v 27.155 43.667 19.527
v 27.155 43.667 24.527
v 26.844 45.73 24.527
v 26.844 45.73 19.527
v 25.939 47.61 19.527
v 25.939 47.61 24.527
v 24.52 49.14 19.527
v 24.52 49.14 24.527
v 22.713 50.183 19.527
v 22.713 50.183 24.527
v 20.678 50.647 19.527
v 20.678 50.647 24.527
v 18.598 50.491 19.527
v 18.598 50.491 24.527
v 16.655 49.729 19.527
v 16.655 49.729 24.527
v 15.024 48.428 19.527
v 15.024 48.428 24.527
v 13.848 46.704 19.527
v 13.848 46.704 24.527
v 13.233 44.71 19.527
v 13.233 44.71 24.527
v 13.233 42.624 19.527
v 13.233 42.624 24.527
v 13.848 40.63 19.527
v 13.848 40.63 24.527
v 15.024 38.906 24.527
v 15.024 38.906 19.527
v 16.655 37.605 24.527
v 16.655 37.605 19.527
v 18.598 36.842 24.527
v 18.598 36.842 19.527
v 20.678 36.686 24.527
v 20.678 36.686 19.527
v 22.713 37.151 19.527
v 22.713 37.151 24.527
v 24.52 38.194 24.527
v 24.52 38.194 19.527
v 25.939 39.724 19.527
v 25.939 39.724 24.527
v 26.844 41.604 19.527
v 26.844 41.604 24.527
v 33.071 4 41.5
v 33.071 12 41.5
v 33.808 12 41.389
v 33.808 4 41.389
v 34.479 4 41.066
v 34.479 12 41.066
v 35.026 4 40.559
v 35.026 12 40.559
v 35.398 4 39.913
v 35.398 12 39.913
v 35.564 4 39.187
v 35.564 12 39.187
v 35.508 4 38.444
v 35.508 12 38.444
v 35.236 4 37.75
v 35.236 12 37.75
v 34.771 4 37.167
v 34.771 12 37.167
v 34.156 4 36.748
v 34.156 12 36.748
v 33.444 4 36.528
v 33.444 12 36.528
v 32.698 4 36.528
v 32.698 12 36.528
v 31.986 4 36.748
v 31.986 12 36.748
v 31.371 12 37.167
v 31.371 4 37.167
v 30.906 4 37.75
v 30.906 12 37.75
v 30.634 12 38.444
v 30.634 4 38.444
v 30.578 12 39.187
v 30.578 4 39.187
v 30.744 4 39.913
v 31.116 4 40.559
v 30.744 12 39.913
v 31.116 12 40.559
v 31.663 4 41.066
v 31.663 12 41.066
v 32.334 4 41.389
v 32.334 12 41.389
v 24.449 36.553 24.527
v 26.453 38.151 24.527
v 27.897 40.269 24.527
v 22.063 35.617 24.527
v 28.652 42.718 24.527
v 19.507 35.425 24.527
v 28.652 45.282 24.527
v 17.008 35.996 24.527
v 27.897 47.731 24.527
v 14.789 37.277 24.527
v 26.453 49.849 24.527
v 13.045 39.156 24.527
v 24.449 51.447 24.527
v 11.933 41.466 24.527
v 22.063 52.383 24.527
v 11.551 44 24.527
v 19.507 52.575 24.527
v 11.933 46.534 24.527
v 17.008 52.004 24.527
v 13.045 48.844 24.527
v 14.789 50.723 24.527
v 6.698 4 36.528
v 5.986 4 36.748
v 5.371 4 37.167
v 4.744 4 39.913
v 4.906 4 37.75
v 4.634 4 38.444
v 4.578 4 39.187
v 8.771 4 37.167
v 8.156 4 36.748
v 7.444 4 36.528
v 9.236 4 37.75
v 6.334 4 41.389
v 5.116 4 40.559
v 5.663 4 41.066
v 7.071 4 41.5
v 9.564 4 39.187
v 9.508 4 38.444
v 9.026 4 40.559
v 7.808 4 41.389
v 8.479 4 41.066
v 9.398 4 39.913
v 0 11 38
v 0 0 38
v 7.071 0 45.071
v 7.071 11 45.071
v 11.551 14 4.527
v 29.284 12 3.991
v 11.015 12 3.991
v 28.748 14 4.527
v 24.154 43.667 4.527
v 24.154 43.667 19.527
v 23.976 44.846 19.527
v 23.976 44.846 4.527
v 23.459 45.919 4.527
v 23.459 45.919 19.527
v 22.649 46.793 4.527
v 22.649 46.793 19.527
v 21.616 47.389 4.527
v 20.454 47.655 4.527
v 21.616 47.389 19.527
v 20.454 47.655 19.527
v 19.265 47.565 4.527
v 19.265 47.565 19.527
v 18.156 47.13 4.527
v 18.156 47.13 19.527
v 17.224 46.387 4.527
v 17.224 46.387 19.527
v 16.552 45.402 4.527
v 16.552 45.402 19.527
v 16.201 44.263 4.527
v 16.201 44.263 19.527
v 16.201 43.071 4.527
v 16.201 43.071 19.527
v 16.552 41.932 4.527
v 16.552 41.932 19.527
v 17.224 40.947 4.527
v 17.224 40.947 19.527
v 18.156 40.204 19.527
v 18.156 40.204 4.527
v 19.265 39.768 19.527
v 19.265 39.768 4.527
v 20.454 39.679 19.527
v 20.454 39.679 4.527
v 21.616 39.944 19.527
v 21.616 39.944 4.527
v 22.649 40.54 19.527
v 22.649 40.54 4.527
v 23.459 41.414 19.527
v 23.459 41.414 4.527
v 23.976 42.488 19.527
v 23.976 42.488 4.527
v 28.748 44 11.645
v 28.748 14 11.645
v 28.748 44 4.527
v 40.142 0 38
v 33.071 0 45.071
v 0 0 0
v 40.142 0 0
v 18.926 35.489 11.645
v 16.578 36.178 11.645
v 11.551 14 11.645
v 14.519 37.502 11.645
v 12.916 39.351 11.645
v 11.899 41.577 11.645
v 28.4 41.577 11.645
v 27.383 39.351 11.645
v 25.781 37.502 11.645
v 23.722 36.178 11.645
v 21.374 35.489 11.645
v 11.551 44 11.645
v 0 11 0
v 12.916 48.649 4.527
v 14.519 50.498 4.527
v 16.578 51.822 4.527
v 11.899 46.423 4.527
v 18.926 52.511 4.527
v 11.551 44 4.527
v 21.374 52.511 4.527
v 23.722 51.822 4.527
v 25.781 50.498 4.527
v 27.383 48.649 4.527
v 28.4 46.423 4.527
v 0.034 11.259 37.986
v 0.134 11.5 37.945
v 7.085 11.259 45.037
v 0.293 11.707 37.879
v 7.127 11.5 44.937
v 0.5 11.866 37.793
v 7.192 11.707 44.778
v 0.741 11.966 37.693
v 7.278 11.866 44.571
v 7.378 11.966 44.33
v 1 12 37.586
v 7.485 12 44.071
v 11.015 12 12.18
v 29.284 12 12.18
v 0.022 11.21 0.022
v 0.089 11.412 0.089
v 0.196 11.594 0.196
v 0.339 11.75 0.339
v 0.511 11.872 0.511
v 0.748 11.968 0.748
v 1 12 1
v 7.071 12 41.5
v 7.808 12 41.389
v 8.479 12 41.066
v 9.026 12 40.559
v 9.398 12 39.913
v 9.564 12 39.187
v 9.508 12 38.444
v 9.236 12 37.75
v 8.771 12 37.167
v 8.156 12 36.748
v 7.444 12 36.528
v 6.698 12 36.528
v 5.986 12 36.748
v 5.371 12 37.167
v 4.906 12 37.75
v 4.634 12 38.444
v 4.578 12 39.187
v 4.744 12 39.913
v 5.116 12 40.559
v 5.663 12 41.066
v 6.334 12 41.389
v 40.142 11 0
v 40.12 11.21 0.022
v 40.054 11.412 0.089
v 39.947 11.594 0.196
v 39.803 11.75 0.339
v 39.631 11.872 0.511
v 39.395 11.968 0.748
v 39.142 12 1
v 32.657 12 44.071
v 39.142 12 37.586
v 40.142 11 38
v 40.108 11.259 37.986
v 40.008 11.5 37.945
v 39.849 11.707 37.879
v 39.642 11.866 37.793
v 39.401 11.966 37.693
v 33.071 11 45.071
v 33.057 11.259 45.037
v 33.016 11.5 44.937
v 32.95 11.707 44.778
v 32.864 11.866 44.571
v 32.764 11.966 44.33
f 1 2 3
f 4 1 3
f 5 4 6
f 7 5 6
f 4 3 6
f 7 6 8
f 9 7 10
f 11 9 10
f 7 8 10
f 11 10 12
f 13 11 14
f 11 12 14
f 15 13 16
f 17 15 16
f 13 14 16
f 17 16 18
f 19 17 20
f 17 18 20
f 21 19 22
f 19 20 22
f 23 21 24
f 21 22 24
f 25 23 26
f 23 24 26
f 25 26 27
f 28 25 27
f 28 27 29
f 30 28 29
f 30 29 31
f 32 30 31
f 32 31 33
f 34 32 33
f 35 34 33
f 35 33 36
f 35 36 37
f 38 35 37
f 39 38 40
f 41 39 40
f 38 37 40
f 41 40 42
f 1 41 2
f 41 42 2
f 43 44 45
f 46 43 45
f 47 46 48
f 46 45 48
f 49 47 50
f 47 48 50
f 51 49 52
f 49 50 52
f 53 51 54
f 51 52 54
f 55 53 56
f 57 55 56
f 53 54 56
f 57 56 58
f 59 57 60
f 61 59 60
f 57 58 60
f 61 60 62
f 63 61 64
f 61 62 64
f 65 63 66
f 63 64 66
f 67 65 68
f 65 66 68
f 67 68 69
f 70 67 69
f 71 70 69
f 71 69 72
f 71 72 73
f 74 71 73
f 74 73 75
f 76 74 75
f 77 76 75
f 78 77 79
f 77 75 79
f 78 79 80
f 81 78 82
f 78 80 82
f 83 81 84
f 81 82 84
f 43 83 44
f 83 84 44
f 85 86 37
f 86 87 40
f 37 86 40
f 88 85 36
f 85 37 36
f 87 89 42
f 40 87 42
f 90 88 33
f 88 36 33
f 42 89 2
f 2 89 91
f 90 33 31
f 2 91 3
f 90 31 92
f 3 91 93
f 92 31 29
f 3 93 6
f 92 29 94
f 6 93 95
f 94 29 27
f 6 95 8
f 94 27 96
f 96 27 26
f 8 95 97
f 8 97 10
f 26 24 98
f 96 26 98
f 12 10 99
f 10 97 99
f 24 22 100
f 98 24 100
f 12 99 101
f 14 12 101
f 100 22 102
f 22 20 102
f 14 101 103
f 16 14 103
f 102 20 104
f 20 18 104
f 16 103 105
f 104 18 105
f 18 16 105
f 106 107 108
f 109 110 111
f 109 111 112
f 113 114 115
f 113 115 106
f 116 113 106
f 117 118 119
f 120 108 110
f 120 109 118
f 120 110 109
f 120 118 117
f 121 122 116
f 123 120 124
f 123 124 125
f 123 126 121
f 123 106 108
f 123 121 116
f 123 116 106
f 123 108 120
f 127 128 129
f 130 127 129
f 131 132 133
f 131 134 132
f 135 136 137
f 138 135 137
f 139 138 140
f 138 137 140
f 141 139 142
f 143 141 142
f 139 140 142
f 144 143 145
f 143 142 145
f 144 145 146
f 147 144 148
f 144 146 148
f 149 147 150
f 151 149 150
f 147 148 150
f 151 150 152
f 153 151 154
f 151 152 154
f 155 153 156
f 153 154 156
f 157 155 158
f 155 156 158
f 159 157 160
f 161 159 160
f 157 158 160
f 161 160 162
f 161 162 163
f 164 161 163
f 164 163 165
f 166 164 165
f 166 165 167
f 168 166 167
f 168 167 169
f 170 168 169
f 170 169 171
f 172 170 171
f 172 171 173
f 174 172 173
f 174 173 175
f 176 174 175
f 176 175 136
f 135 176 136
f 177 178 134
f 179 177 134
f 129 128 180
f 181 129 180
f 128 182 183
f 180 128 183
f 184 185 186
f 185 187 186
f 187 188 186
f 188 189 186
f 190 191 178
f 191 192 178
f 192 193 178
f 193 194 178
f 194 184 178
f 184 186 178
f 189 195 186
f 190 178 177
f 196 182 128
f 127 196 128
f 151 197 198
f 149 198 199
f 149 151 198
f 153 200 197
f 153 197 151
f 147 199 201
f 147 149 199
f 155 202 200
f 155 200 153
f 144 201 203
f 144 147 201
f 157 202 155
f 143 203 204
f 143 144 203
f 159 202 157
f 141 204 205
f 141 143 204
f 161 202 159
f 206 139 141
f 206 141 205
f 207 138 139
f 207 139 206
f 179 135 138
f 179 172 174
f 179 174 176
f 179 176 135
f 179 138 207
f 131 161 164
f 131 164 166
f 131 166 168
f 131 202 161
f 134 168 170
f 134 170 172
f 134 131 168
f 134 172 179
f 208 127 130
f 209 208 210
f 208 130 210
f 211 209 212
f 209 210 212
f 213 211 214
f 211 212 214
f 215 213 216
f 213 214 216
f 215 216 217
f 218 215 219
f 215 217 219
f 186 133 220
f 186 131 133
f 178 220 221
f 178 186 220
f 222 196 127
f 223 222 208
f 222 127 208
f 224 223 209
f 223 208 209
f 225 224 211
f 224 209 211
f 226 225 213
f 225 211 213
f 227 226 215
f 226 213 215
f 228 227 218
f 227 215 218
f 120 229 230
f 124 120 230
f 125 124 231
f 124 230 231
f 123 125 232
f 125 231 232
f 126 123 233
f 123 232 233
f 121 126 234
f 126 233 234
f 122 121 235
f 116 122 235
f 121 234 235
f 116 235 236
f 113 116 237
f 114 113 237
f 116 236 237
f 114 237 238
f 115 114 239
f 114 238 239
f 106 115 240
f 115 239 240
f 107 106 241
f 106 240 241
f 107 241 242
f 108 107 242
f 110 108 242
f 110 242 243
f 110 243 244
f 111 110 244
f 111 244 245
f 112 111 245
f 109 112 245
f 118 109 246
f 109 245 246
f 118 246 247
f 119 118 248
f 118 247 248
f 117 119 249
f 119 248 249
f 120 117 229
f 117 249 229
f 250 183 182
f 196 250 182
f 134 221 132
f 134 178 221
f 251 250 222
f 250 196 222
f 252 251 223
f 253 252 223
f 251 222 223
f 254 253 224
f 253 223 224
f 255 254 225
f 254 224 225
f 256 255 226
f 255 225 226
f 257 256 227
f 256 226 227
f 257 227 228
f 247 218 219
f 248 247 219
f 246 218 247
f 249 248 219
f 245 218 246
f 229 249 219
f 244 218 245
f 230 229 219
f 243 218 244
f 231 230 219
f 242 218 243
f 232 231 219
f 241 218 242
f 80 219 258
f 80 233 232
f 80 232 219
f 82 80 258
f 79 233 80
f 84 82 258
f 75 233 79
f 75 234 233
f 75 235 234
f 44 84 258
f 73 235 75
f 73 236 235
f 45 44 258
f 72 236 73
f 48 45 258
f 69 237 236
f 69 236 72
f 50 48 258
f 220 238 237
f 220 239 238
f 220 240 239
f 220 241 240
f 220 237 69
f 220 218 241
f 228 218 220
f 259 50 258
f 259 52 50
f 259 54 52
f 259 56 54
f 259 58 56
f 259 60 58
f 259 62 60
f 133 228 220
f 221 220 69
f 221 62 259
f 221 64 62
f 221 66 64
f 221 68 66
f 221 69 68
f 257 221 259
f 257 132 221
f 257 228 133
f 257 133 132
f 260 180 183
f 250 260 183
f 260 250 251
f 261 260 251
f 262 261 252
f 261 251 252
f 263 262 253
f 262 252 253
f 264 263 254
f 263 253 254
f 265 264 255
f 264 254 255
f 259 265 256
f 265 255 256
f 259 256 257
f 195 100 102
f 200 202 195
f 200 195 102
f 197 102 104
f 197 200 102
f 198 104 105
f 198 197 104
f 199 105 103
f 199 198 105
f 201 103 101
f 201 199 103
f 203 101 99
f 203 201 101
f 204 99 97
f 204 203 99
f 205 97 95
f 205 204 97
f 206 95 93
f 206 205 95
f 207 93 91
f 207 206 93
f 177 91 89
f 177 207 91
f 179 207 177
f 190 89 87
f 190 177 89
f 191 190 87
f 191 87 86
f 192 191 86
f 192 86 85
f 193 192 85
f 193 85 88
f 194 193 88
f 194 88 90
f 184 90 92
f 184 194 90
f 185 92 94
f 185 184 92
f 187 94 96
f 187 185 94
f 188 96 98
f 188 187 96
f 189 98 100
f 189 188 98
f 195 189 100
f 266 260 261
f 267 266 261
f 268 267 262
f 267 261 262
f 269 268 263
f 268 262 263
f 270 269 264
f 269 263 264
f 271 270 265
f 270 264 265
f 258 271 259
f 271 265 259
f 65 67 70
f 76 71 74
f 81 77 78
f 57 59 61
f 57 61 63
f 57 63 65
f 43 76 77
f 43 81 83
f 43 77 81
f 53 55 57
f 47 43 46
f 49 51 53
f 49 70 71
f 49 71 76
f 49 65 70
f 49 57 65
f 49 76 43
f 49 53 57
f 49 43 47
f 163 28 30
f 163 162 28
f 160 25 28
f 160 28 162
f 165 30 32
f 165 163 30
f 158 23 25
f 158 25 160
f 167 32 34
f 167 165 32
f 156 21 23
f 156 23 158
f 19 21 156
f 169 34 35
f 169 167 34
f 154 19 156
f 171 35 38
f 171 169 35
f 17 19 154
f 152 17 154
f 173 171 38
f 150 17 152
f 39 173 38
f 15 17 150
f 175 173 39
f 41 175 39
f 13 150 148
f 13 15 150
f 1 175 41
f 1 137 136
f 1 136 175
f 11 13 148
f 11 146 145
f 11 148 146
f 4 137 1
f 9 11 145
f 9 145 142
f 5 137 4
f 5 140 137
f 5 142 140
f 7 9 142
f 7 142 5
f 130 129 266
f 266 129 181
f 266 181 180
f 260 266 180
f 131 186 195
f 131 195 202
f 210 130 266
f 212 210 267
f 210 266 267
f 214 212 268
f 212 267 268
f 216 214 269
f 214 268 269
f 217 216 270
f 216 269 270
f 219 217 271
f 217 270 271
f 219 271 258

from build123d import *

# Parameters (mm, degrees)
BOSS_EXTRUDE1_DEPTH = 12
FILLET1_R           = 1
SKETCH2_W           = 18.269103957
SKETCH2_H           = 8.189598326
BOSS_EXTRUDE2_DEPTH = 2
BOSS_EXTRUDE2_TAPER = 15
SKETCH4_W           = 17.197307187
SKETCH4_H           = 7.117801556
BOSS_EXTRUDE3_DEPTH = 30
SKETCH5_R           = 2.5
CUT_EXTRUDE1_DEPTH  = 8
SKETCH6_R           = 8.598653593
BOSS_EXTRUDE4_DEPTH = 20
SKETCH7_R           = 7
SKETCH7_R_2         = 3.99890548
CUT_EXTRUDE2_DEPTH  = 5
SKETCH8_R           = 3.99890548
CUT_EXTRUDE3_DEPTH  = 71.566063032


with BuildPart() as part:
    # Sketch1 → Boss-Extrude1 (new body)
    with BuildSketch(Plane(origin=(0, 0, 0), x_dir=(1, 0, 0), z_dir=(0, 1, 0))):
        Polygon((0, -38), (7.071067812, -45.071067812), (33.071067812, -45.071067812), (40.142135624, -38), (40.142135624, 0), (0, 0), align=None)
    extrude(amount=BOSS_EXTRUDE1_DEPTH)

    # Fillet1
    fillet1_edges = [part.edges().sort_by_distance(p)[0] for p in [
        (20.071067812, 12, 45.071067812),
        (36.606601718, 12, 41.535533906),
        (40.142135624, 12, 19),
        (20.071067812, 12, 0),
        (0, 12, 19),
        (3.535533906, 12, 41.535533906),
    ]]
    fillet(fillet1_edges, radius=FILLET1_R)

    # Sketch2 → Boss-Extrude2 (add)
    with BuildSketch(Plane(origin=(0, 12, 0), x_dir=(1, 0, 0), z_dir=(0, 1, 0))):
        with Locations((20.14981395, -8.08561763)):
            Rectangle(SKETCH2_W, SKETCH2_H)
    extrude(amount=BOSS_EXTRUDE2_DEPTH, taper=BOSS_EXTRUDE2_TAPER)

    # Sketch4 → Boss-Extrude3 (add)
    with BuildSketch(Plane(origin=(0, 14, 0), x_dir=(1, 0, 0), z_dir=(0, 1, 0))):
        with Locations((20.14981395, -8.08561763)):
            Rectangle(SKETCH4_W, SKETCH4_H)
    extrude(amount=BOSS_EXTRUDE3_DEPTH)

    # Sketch5 → Cut-Extrude1 (cut)
    with BuildSketch(Plane(origin=(0, 12, 0), x_dir=(1, 0, 0), z_dir=(0, 1, 0))):
        with Locations(Location((33.071067812, -39, 0), (0, 0, 270))):
            Circle(SKETCH5_R)
        with Locations(Location((7.071067812, -39, 0), (0, 0, 270))):
            Circle(SKETCH5_R)
    extrude(amount=-CUT_EXTRUDE1_DEPTH, mode=Mode.SUBTRACT)

    # Sketch6 → Boss-Extrude4 (add)
    with BuildSketch(Plane(origin=(0, 0, 4.526716852), x_dir=(-1, 0, 0), z_dir=(0, 0, -1))):
        with Locations((-20.14981395, 44)):
            Circle(SKETCH6_R)
    extrude(amount=-BOSS_EXTRUDE4_DEPTH)

    # Sketch7 → Cut-Extrude2 (cut)
    with BuildSketch(Plane.XY.offset(24.526716852)):
        with Locations((20.155228961, 43.666817717)):
            Circle(SKETCH7_R)
        with Locations((20.155228961, 43.666817717)):
            Circle(SKETCH7_R_2, mode=Mode.SUBTRACT)
    extrude(amount=-CUT_EXTRUDE2_DEPTH, mode=Mode.SUBTRACT)

    # Sketch8 → Cut-Extrude3 (cut, through all)
    with BuildSketch(Plane.XY.offset(24.526716852)):
        with Locations((20.155228961, 43.666817717)):
            Circle(SKETCH8_R)
    extrude(amount=-CUT_EXTRUDE3_DEPTH, mode=Mode.SUBTRACT)


solid = part.part
